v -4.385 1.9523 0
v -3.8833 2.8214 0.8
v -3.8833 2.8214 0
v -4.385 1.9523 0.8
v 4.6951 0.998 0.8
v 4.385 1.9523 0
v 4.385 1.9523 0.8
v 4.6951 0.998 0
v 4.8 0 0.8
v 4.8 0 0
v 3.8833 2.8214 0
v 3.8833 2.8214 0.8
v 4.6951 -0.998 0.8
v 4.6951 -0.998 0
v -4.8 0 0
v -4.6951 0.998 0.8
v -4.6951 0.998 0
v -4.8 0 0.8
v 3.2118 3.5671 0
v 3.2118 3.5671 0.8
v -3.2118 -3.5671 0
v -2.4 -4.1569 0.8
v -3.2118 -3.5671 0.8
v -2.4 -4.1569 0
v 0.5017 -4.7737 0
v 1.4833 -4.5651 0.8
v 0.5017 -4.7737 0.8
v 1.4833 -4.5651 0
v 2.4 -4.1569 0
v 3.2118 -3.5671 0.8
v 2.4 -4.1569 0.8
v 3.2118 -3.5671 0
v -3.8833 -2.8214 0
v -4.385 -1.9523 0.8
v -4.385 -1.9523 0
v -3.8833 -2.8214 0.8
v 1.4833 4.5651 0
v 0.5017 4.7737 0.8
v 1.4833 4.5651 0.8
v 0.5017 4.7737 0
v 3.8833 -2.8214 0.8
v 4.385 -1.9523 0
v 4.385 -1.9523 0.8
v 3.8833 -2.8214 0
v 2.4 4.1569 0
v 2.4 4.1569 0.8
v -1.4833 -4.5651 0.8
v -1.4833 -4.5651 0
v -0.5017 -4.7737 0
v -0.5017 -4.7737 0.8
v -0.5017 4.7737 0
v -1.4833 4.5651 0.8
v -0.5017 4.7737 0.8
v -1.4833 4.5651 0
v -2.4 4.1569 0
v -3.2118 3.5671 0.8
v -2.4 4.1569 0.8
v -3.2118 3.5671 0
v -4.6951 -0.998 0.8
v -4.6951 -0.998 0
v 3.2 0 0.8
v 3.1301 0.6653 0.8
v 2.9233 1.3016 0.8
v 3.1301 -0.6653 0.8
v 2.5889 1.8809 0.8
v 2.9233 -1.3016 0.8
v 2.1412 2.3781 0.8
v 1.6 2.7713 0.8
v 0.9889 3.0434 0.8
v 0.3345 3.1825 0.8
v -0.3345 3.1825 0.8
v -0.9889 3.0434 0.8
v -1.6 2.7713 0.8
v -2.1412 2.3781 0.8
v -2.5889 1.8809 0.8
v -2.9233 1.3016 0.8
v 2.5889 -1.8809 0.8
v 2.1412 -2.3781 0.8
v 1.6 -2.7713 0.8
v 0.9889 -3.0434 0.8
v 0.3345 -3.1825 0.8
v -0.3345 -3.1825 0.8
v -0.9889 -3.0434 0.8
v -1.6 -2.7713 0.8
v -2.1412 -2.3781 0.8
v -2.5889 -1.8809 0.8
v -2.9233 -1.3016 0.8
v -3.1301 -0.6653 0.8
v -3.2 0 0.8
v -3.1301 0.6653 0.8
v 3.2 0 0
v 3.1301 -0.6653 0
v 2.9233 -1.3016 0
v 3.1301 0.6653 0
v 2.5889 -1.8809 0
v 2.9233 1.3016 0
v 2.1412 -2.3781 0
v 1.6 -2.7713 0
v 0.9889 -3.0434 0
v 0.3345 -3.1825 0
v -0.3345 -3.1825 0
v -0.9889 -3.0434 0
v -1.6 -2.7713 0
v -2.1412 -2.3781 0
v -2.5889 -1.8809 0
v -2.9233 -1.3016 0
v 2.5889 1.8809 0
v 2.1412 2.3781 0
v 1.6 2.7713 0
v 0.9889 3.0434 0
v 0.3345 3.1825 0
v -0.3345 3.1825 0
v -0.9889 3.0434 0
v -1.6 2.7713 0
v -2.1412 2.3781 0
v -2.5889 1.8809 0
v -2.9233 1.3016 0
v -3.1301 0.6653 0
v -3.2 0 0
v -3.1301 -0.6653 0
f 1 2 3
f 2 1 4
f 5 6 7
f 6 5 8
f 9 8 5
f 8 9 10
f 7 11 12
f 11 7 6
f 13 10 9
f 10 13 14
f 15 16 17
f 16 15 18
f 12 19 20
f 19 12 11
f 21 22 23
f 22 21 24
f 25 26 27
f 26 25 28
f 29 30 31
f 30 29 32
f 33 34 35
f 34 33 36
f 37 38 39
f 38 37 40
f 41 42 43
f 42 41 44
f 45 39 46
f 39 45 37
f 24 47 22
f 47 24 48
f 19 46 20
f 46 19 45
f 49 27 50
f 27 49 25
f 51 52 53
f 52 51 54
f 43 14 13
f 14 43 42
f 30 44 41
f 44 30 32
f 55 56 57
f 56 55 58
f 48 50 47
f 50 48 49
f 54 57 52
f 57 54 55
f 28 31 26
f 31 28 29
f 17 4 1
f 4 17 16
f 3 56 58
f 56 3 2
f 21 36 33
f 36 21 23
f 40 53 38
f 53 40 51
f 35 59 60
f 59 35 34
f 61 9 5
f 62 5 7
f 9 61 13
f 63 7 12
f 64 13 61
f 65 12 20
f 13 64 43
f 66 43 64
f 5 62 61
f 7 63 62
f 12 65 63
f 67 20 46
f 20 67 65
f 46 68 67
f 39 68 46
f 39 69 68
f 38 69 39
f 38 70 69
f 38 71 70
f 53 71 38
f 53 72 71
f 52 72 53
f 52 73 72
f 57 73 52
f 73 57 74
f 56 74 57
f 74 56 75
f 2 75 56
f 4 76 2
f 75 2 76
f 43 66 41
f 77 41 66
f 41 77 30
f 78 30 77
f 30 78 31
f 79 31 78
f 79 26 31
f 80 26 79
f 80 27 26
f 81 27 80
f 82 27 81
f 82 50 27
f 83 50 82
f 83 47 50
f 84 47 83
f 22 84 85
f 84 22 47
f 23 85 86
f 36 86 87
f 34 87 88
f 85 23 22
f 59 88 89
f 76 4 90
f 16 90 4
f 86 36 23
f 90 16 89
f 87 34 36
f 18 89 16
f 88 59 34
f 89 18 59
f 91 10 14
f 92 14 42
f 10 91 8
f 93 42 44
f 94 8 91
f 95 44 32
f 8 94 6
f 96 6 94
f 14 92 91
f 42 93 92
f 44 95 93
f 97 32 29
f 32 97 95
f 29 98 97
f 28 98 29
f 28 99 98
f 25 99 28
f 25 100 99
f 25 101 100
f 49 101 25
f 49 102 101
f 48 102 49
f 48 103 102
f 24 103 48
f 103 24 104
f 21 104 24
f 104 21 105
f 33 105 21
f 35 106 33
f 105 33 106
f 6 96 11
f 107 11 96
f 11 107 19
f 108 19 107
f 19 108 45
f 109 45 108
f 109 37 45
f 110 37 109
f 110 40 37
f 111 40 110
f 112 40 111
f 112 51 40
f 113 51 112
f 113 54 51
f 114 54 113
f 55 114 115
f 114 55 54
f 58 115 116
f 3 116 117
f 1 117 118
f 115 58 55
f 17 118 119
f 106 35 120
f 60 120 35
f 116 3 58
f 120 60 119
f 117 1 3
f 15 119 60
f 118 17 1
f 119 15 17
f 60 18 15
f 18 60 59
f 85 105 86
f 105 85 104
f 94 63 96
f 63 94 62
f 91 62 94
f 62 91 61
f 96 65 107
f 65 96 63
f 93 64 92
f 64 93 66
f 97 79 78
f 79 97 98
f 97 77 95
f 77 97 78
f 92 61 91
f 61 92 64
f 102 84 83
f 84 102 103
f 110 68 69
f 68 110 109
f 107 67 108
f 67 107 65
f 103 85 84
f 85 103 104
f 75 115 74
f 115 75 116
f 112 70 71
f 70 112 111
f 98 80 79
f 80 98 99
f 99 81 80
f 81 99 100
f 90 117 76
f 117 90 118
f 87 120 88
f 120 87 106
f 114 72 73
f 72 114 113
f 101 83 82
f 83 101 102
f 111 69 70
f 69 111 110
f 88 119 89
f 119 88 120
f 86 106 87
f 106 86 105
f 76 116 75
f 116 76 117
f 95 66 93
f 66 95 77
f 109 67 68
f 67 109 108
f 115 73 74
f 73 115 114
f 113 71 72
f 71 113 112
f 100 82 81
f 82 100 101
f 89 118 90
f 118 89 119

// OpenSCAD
a = 0.8; // washer thickness
b = 3.2; // washer rim width
c = 6.4; // washer ID

$fs=0.02;
translate ([0,0,a/2]) {
    difference() {
        cylinder(a, r=(b+c)/2, center=true);
        cylinder(a, r=c/2, center=true);
    }
}
